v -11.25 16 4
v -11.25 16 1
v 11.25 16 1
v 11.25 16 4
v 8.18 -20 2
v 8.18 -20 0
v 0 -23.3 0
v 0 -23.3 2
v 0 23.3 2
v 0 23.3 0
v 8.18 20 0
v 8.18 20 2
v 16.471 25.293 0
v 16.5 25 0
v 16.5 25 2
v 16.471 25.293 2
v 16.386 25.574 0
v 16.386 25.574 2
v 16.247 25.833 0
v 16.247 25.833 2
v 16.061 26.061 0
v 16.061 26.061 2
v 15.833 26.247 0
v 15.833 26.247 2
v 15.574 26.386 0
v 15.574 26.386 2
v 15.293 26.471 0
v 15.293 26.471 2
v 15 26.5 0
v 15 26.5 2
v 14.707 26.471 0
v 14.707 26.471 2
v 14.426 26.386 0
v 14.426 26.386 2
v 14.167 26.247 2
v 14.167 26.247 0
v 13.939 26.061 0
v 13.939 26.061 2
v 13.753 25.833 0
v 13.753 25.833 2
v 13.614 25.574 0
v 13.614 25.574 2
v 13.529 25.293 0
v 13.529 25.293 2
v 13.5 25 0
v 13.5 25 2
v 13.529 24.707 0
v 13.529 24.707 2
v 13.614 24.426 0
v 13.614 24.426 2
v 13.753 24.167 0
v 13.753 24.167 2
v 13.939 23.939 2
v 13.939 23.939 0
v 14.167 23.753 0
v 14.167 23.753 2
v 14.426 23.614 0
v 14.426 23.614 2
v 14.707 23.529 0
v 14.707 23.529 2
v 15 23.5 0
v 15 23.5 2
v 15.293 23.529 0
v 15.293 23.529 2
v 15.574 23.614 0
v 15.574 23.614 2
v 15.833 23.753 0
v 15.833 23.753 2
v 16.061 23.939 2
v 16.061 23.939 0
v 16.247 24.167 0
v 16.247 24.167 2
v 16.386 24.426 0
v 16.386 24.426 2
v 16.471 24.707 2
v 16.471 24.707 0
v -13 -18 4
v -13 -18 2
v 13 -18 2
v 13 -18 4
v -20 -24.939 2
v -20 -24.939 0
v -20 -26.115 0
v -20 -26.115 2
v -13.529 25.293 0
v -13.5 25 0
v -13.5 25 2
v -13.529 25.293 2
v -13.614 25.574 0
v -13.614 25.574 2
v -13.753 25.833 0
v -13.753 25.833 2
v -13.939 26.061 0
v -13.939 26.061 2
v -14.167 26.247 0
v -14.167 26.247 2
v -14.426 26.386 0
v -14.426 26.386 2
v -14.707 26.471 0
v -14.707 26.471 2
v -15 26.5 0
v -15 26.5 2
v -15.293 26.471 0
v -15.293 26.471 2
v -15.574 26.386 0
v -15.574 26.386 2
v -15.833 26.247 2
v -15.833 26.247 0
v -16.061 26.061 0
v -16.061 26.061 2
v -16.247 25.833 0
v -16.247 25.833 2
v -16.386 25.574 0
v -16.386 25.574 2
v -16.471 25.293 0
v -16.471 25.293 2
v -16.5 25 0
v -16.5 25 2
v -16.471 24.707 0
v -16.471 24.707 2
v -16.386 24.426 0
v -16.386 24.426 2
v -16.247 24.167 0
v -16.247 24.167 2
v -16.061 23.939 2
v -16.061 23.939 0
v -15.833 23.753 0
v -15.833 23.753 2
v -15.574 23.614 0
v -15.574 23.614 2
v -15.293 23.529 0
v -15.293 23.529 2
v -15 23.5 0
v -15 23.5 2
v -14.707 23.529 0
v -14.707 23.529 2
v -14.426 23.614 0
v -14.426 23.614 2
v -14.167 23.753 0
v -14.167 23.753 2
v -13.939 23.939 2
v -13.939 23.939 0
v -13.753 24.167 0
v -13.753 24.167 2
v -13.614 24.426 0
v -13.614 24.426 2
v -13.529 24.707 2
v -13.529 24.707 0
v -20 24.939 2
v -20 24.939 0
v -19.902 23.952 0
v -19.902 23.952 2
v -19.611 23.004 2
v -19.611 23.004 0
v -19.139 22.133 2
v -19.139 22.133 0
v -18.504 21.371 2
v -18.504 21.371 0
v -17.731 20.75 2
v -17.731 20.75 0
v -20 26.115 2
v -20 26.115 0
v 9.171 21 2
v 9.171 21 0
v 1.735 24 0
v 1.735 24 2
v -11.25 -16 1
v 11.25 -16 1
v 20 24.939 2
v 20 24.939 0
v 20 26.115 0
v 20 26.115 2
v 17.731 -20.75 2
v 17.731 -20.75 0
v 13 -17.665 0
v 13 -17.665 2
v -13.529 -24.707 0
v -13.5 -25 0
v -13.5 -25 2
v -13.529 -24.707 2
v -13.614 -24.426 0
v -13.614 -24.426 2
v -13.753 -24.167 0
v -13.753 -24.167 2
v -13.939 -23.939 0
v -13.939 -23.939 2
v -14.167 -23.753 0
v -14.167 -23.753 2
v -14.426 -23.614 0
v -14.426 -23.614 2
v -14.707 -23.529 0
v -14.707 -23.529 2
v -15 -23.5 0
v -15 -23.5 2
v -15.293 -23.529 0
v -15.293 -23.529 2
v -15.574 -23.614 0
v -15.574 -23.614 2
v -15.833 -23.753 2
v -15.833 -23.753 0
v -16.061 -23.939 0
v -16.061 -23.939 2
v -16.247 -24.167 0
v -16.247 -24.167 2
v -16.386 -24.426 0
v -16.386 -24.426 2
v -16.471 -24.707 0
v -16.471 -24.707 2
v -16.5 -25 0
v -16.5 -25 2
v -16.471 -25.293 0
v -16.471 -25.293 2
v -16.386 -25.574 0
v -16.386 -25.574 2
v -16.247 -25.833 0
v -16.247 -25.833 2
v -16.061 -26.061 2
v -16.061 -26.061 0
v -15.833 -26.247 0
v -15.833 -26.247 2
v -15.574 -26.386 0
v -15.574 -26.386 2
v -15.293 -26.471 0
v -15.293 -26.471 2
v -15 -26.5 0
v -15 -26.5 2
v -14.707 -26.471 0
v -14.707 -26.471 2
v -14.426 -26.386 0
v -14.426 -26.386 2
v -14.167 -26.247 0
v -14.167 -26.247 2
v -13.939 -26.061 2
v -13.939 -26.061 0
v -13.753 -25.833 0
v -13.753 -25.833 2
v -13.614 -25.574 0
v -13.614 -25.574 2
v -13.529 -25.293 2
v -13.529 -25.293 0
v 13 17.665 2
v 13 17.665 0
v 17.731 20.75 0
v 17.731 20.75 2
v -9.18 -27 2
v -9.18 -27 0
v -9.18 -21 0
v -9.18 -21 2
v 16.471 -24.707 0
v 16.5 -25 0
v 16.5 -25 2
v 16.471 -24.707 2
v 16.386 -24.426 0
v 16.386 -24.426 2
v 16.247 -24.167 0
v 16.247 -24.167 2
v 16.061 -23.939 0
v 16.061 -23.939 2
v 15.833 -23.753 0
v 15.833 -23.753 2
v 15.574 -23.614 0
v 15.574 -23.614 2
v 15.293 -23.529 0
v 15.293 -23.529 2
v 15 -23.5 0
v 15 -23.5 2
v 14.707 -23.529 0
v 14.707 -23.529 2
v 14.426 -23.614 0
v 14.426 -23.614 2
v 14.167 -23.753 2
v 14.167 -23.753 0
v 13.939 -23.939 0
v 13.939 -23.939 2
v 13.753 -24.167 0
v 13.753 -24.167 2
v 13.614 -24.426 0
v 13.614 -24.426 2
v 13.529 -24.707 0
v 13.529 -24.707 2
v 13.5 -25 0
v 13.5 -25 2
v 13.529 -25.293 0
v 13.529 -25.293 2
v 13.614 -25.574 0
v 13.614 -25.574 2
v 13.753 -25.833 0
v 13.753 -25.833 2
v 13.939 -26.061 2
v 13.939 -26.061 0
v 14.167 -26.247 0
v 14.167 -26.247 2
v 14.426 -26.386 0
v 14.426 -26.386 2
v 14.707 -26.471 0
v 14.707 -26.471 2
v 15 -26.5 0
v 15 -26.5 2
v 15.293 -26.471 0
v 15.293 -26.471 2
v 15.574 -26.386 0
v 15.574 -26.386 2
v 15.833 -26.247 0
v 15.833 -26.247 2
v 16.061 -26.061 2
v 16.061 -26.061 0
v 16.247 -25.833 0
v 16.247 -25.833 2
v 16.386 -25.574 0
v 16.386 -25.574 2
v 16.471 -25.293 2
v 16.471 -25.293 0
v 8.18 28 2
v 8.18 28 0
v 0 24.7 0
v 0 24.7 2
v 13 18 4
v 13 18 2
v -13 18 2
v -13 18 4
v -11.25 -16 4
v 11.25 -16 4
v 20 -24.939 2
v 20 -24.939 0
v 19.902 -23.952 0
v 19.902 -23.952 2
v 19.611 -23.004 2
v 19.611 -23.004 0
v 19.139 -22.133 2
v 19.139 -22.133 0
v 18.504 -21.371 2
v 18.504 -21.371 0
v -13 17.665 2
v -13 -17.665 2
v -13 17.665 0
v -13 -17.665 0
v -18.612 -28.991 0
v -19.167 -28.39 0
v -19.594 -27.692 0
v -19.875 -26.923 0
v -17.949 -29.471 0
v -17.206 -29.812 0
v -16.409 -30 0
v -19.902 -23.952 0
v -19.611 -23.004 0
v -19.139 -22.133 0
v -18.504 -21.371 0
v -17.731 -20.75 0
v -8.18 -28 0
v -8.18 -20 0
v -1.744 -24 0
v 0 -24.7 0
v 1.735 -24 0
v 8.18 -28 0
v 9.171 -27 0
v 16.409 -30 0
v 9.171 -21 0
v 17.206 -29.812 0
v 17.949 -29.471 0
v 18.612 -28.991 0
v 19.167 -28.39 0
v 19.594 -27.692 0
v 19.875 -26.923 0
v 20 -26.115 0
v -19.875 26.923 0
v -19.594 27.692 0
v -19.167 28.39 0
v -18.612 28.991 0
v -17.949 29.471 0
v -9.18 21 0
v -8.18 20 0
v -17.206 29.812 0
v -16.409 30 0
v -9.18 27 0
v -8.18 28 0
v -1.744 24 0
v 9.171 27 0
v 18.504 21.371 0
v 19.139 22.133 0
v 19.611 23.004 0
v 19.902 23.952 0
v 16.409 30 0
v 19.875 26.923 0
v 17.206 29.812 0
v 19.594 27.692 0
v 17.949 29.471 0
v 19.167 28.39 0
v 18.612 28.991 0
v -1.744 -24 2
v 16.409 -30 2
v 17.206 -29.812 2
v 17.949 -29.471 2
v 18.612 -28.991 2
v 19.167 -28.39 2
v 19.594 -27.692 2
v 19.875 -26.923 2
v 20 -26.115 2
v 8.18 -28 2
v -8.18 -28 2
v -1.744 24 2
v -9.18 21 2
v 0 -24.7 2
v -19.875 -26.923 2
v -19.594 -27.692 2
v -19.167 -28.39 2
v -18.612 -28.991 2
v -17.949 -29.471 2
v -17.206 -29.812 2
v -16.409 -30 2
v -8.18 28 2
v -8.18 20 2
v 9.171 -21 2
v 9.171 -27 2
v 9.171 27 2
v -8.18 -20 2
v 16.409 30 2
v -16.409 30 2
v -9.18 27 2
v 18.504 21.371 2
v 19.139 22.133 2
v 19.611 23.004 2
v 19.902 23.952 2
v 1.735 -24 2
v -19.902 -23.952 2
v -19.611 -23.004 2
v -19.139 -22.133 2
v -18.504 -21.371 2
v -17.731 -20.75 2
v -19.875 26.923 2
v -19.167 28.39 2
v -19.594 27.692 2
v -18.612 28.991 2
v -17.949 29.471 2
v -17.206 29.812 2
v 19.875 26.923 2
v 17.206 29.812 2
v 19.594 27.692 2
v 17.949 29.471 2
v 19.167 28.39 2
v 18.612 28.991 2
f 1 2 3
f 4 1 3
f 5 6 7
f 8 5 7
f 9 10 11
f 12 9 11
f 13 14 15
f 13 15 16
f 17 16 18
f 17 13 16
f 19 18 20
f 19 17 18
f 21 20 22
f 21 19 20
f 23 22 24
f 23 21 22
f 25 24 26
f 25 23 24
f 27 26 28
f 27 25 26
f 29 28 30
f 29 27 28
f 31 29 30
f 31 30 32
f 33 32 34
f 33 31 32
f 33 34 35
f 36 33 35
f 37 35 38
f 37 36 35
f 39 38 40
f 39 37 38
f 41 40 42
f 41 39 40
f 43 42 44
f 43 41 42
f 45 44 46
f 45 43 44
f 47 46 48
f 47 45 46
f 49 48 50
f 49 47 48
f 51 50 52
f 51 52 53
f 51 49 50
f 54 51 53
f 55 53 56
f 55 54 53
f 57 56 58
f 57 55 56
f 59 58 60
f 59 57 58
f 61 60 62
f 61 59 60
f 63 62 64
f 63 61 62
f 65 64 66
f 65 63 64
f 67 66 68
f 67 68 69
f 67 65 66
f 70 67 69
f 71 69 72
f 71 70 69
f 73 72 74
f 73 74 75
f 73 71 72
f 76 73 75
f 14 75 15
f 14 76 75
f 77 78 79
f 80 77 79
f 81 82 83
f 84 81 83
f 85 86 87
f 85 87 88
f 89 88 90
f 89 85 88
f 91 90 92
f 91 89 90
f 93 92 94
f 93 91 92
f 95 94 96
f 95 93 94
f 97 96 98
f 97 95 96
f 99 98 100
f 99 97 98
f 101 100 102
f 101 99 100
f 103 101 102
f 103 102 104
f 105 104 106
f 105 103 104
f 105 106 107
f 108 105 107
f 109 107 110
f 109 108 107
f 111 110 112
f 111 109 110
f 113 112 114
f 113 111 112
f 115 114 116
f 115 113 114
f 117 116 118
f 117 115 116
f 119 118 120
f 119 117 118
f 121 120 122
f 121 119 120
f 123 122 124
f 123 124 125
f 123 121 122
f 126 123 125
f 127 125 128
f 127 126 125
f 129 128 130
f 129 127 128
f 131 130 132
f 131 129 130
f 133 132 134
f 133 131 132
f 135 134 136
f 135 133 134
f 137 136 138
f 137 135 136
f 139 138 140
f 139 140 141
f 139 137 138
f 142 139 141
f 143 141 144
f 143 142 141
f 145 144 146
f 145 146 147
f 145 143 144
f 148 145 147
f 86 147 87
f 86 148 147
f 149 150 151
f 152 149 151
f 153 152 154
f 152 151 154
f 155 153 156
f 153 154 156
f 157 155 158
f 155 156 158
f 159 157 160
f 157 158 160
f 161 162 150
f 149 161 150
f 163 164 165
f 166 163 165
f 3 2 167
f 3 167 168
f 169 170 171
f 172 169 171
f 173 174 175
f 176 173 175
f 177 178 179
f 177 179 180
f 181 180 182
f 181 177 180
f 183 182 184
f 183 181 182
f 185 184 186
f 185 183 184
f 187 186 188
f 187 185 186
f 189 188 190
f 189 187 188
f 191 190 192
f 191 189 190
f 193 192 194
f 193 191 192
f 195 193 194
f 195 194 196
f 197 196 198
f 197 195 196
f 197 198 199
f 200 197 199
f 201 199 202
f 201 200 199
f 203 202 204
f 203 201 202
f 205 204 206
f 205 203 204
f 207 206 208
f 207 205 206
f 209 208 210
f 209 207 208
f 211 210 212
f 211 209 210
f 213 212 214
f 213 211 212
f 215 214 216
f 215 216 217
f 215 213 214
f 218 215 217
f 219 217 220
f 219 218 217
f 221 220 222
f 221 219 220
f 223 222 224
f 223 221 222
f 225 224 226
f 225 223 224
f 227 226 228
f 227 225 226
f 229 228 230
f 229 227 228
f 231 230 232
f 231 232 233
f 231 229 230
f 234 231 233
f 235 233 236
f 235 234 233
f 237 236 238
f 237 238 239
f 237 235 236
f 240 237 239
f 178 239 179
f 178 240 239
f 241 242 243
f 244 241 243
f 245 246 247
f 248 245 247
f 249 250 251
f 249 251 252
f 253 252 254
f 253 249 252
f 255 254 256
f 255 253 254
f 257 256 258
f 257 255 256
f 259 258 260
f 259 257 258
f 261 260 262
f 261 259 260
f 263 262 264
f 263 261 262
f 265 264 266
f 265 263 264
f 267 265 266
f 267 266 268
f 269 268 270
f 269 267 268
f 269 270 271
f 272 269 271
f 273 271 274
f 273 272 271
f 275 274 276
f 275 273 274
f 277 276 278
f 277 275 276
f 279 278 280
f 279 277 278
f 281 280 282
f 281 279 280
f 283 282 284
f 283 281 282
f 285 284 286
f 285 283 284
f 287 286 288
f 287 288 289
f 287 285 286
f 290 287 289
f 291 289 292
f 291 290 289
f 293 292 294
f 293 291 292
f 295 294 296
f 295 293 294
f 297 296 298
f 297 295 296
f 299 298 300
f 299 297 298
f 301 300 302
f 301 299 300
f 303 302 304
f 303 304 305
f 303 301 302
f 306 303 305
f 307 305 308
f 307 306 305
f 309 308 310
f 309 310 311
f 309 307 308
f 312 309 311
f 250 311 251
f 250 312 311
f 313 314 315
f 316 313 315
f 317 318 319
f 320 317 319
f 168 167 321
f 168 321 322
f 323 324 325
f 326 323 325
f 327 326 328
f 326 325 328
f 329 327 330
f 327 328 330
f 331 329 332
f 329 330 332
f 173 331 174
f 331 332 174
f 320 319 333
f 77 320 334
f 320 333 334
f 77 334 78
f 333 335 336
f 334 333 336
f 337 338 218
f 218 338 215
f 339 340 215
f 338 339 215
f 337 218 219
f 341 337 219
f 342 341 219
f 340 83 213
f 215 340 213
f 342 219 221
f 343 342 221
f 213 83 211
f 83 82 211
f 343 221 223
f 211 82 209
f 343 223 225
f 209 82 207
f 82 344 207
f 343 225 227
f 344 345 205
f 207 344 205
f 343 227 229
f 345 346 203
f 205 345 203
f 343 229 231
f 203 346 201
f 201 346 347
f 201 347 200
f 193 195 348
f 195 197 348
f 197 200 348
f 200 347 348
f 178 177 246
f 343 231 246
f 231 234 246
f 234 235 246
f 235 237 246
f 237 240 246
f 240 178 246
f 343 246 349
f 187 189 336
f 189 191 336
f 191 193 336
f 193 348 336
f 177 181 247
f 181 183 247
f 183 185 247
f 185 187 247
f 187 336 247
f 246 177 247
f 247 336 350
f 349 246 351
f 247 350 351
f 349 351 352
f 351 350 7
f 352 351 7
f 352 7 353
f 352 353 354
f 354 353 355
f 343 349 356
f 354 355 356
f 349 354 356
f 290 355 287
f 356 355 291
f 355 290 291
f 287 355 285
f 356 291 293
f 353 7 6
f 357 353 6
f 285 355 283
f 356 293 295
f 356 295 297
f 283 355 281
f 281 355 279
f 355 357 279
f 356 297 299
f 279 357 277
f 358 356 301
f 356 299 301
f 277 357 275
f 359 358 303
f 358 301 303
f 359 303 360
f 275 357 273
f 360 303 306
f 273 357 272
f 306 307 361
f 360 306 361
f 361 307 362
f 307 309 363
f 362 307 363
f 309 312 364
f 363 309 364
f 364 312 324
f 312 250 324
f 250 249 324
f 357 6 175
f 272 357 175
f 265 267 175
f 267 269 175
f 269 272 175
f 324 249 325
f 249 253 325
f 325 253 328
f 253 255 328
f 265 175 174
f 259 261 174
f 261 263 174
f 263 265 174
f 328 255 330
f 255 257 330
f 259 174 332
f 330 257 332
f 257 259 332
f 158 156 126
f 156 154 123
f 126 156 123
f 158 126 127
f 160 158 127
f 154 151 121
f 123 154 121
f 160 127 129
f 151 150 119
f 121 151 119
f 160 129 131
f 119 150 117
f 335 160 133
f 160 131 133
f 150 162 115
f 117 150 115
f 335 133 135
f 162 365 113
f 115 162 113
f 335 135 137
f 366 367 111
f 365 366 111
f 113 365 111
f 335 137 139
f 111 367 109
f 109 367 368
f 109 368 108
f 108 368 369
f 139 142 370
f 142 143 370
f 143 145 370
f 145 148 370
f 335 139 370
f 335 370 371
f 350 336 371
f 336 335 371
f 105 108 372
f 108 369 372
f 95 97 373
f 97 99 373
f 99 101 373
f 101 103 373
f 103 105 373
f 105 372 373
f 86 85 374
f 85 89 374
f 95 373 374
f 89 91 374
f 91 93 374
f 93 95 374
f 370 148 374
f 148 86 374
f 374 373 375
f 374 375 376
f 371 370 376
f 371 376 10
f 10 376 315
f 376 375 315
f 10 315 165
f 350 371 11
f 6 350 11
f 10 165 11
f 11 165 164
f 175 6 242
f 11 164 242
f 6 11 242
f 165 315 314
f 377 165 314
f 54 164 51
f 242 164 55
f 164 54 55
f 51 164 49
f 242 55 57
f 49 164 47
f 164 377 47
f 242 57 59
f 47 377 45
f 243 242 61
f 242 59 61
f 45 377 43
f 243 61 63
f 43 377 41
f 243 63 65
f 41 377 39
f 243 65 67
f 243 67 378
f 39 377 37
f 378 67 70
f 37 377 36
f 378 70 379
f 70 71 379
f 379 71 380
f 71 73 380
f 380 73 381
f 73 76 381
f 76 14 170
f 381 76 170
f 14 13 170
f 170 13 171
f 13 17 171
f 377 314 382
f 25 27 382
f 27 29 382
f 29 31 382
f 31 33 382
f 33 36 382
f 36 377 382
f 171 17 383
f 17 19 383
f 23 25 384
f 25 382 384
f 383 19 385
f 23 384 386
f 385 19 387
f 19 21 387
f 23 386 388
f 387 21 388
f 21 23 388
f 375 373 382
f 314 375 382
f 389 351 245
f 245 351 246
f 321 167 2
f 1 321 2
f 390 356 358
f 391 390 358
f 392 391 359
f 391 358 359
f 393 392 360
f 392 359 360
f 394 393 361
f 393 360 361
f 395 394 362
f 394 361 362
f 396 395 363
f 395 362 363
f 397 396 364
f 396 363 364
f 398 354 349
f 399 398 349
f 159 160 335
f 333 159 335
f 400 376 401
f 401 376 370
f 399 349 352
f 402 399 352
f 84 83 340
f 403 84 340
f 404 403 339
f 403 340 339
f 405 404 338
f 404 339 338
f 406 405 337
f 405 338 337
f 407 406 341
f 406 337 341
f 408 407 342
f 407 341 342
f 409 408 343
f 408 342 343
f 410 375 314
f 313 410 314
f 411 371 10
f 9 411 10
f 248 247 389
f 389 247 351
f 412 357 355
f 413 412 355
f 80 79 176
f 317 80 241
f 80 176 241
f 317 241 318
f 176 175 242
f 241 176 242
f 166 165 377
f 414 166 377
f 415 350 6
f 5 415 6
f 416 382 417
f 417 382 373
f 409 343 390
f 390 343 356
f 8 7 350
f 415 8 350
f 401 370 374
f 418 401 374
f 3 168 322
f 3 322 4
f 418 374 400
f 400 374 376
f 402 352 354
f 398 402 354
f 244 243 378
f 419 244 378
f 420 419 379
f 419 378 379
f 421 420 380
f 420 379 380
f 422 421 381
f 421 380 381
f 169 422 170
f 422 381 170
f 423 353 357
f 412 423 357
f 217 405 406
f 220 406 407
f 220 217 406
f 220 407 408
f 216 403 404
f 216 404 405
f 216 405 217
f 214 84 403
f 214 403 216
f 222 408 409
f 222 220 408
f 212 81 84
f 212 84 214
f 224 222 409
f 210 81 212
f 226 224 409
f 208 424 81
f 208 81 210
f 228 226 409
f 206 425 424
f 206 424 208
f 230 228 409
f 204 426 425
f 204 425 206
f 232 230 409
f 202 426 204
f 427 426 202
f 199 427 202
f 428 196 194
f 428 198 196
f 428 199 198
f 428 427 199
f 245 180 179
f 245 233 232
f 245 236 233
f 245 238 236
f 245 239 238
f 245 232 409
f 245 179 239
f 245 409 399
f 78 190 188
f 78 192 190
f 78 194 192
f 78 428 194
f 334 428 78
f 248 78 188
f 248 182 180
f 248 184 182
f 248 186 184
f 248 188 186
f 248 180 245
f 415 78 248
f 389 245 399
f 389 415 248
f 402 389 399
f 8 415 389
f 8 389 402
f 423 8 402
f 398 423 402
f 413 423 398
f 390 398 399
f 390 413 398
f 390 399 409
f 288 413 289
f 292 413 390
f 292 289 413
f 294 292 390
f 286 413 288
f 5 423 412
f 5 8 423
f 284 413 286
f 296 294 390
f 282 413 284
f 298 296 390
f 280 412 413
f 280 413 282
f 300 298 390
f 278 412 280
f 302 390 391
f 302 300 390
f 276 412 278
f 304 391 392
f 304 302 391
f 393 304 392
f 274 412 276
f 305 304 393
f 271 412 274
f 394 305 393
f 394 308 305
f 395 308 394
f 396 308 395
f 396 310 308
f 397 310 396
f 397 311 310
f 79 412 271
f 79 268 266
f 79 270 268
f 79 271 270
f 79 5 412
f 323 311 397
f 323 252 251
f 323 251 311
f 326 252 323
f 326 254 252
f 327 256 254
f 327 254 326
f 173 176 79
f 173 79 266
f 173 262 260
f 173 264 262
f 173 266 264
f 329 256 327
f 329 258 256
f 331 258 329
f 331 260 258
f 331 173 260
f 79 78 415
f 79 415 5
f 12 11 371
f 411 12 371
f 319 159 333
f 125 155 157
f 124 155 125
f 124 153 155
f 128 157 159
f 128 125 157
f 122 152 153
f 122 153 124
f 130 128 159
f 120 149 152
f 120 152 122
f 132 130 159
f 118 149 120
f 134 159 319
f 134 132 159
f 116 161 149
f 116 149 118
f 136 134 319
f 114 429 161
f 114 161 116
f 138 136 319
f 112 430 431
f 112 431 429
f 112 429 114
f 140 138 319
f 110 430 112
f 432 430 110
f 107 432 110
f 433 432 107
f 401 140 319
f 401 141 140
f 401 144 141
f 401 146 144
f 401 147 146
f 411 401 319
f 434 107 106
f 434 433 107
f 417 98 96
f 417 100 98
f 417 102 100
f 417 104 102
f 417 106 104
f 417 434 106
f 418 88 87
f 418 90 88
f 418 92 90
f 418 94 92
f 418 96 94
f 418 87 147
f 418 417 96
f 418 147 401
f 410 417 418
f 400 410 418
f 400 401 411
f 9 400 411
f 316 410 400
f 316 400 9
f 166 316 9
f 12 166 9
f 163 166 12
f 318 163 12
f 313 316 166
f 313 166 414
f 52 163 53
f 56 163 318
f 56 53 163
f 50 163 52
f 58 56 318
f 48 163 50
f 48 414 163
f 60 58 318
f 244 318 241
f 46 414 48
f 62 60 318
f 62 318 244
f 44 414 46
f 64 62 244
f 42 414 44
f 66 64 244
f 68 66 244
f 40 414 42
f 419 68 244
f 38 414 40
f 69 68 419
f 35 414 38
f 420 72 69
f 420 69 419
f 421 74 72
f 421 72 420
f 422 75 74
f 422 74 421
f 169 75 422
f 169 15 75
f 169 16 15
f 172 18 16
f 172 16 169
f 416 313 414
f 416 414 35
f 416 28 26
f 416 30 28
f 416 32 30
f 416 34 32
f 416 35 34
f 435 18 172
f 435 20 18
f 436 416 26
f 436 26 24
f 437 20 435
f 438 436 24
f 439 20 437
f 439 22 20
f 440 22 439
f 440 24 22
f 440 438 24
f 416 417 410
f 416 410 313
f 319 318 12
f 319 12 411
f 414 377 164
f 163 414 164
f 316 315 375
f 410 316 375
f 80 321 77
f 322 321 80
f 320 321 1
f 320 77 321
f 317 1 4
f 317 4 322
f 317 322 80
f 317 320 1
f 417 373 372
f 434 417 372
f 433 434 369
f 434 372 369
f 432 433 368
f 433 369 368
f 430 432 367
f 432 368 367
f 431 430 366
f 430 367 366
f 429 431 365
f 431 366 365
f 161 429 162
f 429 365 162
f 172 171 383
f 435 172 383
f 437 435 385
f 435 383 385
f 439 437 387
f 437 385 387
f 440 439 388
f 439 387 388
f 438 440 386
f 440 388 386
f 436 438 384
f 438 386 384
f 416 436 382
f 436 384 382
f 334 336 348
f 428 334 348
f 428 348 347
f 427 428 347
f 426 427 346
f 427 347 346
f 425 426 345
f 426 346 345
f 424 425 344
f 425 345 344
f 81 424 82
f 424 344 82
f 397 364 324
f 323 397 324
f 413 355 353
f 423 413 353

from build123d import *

# Parameters (mm, degrees)
F0_R     = 3.5
F0_R_2   = 1.5
F1_DEPTH = 2
F0_W     = 22.5
F0_H     = 32
F2_DEPTH = 4
F3_DEPTH = 1


with BuildPart() as f1:
    # F0 (on Top) → F1 (new body)
    with BuildSketch(Plane.XY):
        with BuildLine():
            ThreePointArc((20, 26.114874), (18.904278, 28.704066), (16.409269, 30))
            Line((16.409269, 30), (-16.409269, 30))
            ThreePointArc((-16.409269, 30), (-18.904278, 28.704066), (-20, 26.114874))
            Line((-20, 26.114874), (-20, 24.938533))
            ThreePointArc((-20, 24.938533), (-19.396294, 22.556811), (-17.73096, 20.750233))
            Line((-17.73096, 20.750233), (-13, 17.665434))
            Line((-13, 17.665434), (-13, 18))
            Line((-13, 18), (13, 18))
            Line((13, 18), (13, 17.665434))
            Line((13, 17.665434), (17.73096, 20.750233))
            ThreePointArc((17.73096, 20.750233), (19.396294, 22.556811), (20, 24.938533))
            Line((20, 24.938533), (20, 26.114874))
        make_face()
        with Locations((-15, 25)):
            Circle(F0_R, mode=Mode.SUBTRACT)
        Polygon((-9.18, 27), (-9.18, 28), (-8.18, 28), (8.18, 28), (9.170838, 28), (9.170838, 27), (9.170838, 21), (9.170838, 20), (8.18, 20), (-8.18, 20), (-9.18, 20), (-9.18, 21), align=None, mode=Mode.SUBTRACT)
        with Locations((15, 25)):
            Circle(F0_R, mode=Mode.SUBTRACT)
        with BuildLine():
            Line((17.73096, -20.750233), (13, -17.665434))
            Line((13, -17.665434), (13, -18))
            Line((13, -18), (-13, -18))
            Line((-13, -18), (-13, -17.665434))
            Line((-13, -17.665434), (-17.73096, -20.750233))
            ThreePointArc((-17.73096, -20.750233), (-19.396294, -22.556811), (-20, -24.938533))
            Line((-20, -24.938533), (-20, -26.114874))
            ThreePointArc((-20, -26.114874), (-18.904278, -28.704066), (-16.409269, -30))
            Line((-16.409269, -30), (16.409269, -30))
            ThreePointArc((16.409269, -30), (18.904278, -28.704066), (20, -26.114874))
            Line((20, -26.114874), (20, -24.938533))
            ThreePointArc((20, -24.938533), (19.396294, -22.556811), (17.73096, -20.750233))
        make_face()
        with Locations((-15, -25)):
            Circle(F0_R, mode=Mode.SUBTRACT)
        Polygon((-8.18, -20), (8.18, -20), (9.170838, -20), (9.170838, -21), (9.170838, -27), (9.170838, -28), (8.18, -28), (-8.18, -28), (-9.18, -28), (-9.18, -27), (-9.18, -21), (-9.18, -20), align=None, mode=Mode.SUBTRACT)
        with Locations((15, -25)):
            Circle(F0_R, mode=Mode.SUBTRACT)
        with Locations((-15, -25)):
            Circle(F0_R)
        with Locations((-15, -25)):
            Circle(F0_R_2, mode=Mode.SUBTRACT)
        with Locations((15, -25)):
            Circle(F0_R)
        with Locations((15, -25)):
            Circle(F0_R_2, mode=Mode.SUBTRACT)
        with Locations((15, 25)):
            Circle(F0_R)
        with Locations((15, 25)):
            Circle(F0_R_2, mode=Mode.SUBTRACT)
        with Locations((-15, 25)):
            Circle(F0_R)
        with Locations((-15, 25)):
            Circle(F0_R_2, mode=Mode.SUBTRACT)
        Polygon((-8.18, 28), (-9.18, 28), (-9.18, 27), (-1.743927, 24), (-9.18, 21), (-9.18, 20), (-8.18, 20), (0, 23.300129), (8.18, 20), (9.170838, 20), (9.170838, 21), (1.734764, 24), (9.170838, 27), (9.170838, 28), (8.18, 28), (0, 24.699871), align=None)
        Polygon((9.170838, -20), (8.18, -20), (0, -23.300129), (-8.18, -20), (-9.18, -20), (-9.18, -21), (-1.743927, -24), (-9.18, -27), (-9.18, -28), (-8.18, -28), (0, -24.699871), (8.18, -28), (9.170838, -28), (9.170838, -27), (1.734764, -24), (9.170838, -21), align=None)
    extrude(amount=F1_DEPTH)

    # F0 (on Top) → F2 (join)
    with BuildSketch(Plane.XY):
        Polygon((13, -17.665434), (13, 17.665434), (13, 18), (-13, 18), (-13, 17.665434), (-13, -17.665434), (-13, -18), (13, -18), align=None)
        Rectangle(F0_W, F0_H, mode=Mode.SUBTRACT)
    extrude(amount=F2_DEPTH)

    # F0 (on Top) → F3 (join)
    with BuildSketch(Plane.XY):
        Rectangle(F0_W, F0_H)
    extrude(amount=F3_DEPTH)


solid = f1.part
